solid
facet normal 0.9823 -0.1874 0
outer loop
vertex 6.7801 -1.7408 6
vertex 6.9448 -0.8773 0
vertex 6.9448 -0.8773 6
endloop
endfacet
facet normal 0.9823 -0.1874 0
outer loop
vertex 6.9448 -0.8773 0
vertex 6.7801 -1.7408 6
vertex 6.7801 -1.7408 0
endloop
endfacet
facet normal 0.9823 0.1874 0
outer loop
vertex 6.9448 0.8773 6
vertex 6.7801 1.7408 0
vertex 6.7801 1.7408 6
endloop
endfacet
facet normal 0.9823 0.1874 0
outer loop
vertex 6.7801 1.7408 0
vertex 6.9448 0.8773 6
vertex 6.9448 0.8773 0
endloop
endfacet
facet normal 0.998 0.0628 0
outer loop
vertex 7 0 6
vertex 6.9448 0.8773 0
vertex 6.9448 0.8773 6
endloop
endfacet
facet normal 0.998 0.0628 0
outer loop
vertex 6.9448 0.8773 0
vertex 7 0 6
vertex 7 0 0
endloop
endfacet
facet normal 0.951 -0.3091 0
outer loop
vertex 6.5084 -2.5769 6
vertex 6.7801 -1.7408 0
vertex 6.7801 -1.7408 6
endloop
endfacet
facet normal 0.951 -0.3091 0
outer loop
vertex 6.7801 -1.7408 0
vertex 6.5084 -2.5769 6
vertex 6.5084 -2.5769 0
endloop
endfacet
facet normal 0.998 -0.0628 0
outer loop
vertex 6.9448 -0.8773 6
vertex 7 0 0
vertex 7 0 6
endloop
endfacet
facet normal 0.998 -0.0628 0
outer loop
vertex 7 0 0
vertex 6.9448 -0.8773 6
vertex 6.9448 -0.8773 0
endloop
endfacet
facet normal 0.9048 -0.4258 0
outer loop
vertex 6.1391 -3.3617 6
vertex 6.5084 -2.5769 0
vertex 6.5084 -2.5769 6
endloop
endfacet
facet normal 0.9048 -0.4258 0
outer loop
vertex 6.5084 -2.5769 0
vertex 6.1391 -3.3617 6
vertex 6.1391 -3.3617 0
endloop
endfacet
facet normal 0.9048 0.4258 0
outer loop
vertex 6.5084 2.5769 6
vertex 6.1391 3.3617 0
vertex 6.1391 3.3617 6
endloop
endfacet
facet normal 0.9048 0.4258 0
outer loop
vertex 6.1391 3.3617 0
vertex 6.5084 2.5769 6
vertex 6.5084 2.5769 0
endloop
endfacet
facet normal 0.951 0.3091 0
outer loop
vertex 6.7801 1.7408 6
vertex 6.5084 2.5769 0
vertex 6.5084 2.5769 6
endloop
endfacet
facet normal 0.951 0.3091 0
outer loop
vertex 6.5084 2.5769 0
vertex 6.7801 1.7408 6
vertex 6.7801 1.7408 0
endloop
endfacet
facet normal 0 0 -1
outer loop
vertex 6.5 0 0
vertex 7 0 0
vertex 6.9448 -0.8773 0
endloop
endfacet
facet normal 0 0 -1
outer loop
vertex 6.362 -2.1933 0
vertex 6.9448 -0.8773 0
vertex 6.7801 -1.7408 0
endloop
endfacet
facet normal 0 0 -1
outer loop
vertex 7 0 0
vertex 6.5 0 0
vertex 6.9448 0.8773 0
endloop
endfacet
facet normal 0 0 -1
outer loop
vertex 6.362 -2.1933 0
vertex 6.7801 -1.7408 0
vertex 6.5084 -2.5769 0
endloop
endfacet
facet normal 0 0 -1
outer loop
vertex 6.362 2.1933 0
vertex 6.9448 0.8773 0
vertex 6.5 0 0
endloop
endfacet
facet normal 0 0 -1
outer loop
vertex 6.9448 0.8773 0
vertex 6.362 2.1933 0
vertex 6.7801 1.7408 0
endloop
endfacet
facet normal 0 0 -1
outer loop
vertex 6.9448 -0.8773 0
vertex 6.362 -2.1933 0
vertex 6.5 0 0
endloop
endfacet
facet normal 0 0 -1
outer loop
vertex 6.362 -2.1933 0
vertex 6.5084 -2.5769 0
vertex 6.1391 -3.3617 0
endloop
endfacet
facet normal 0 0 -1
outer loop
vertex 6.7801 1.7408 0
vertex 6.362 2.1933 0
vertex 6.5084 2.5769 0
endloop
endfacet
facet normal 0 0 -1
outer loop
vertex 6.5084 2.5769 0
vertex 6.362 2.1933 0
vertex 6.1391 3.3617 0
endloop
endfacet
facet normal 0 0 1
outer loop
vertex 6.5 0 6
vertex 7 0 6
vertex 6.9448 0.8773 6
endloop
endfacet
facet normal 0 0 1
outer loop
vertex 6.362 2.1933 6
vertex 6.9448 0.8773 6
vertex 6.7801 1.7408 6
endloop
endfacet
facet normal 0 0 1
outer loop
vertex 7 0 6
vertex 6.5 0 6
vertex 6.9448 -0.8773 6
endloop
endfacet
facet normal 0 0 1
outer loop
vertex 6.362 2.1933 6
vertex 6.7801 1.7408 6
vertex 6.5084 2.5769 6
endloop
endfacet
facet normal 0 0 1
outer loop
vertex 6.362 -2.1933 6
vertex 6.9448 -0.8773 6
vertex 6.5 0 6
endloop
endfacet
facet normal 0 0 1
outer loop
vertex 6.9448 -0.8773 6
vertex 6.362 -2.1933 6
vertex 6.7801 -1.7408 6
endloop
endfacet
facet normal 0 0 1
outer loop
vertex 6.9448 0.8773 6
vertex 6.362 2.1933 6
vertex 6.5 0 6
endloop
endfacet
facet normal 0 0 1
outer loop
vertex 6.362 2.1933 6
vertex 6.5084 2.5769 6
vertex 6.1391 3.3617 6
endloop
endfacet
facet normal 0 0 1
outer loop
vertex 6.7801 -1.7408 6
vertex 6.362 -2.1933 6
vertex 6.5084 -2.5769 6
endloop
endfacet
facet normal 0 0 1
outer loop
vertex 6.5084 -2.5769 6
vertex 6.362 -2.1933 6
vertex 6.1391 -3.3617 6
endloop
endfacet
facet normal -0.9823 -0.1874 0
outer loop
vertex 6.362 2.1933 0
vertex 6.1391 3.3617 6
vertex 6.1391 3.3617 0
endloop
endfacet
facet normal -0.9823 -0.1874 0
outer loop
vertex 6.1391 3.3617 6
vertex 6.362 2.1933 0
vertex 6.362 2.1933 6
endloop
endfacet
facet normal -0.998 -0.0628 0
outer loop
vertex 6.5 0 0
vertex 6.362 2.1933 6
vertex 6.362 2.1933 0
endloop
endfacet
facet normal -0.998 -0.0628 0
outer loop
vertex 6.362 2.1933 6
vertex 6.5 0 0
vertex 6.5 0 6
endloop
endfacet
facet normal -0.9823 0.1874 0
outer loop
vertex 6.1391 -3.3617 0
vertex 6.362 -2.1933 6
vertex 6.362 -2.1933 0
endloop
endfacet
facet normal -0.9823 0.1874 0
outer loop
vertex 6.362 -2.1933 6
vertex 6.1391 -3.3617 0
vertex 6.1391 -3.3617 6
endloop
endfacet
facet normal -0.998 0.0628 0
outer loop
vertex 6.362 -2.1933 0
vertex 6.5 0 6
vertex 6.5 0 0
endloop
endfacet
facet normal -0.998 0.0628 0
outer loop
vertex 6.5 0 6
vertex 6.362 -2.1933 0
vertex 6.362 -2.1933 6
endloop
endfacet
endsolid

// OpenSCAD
$fn = 50;


difference() {
	union() {
		cylinder(h = 6, r = 7.0000000000);
		translate(v = [-14.0000000000, 0, 0]) {
			cylinder(h = 6, r = 7.0000000000);
		}
	}
	union() {
		cylinder(h = 6, r = 3.2500000000);
		cylinder(h = 6, r = 1.8000000000);
		cylinder(h = 6, r = 1.8000000000);
		cylinder(h = 6, r = 1.8000000000);
		translate(v = [-18.5000000000, 0, 0]) {
			hull() {
				translate(v = [-3.7500000000, 0.0000000000, 0]) {
					cylinder(h = 6, r = 7.5000000000);
				}
				translate(v = [3.7500000000, 0.0000000000, 0]) {
					cylinder(h = 6, r = 7.5000000000);
				}
				translate(v = [-3.7500000000, -0.0000000000, 0]) {
					cylinder(h = 6, r = 7.5000000000);
				}
				translate(v = [3.7500000000, -0.0000000000, 0]) {
					cylinder(h = 6, r = 7.5000000000);
				}
			}
		}
		translate(v = [-11.0000000000, 0, 0.0000000000]) {
			cylinder(h = 6, r = 17.5000000000);
		}
	}
}
